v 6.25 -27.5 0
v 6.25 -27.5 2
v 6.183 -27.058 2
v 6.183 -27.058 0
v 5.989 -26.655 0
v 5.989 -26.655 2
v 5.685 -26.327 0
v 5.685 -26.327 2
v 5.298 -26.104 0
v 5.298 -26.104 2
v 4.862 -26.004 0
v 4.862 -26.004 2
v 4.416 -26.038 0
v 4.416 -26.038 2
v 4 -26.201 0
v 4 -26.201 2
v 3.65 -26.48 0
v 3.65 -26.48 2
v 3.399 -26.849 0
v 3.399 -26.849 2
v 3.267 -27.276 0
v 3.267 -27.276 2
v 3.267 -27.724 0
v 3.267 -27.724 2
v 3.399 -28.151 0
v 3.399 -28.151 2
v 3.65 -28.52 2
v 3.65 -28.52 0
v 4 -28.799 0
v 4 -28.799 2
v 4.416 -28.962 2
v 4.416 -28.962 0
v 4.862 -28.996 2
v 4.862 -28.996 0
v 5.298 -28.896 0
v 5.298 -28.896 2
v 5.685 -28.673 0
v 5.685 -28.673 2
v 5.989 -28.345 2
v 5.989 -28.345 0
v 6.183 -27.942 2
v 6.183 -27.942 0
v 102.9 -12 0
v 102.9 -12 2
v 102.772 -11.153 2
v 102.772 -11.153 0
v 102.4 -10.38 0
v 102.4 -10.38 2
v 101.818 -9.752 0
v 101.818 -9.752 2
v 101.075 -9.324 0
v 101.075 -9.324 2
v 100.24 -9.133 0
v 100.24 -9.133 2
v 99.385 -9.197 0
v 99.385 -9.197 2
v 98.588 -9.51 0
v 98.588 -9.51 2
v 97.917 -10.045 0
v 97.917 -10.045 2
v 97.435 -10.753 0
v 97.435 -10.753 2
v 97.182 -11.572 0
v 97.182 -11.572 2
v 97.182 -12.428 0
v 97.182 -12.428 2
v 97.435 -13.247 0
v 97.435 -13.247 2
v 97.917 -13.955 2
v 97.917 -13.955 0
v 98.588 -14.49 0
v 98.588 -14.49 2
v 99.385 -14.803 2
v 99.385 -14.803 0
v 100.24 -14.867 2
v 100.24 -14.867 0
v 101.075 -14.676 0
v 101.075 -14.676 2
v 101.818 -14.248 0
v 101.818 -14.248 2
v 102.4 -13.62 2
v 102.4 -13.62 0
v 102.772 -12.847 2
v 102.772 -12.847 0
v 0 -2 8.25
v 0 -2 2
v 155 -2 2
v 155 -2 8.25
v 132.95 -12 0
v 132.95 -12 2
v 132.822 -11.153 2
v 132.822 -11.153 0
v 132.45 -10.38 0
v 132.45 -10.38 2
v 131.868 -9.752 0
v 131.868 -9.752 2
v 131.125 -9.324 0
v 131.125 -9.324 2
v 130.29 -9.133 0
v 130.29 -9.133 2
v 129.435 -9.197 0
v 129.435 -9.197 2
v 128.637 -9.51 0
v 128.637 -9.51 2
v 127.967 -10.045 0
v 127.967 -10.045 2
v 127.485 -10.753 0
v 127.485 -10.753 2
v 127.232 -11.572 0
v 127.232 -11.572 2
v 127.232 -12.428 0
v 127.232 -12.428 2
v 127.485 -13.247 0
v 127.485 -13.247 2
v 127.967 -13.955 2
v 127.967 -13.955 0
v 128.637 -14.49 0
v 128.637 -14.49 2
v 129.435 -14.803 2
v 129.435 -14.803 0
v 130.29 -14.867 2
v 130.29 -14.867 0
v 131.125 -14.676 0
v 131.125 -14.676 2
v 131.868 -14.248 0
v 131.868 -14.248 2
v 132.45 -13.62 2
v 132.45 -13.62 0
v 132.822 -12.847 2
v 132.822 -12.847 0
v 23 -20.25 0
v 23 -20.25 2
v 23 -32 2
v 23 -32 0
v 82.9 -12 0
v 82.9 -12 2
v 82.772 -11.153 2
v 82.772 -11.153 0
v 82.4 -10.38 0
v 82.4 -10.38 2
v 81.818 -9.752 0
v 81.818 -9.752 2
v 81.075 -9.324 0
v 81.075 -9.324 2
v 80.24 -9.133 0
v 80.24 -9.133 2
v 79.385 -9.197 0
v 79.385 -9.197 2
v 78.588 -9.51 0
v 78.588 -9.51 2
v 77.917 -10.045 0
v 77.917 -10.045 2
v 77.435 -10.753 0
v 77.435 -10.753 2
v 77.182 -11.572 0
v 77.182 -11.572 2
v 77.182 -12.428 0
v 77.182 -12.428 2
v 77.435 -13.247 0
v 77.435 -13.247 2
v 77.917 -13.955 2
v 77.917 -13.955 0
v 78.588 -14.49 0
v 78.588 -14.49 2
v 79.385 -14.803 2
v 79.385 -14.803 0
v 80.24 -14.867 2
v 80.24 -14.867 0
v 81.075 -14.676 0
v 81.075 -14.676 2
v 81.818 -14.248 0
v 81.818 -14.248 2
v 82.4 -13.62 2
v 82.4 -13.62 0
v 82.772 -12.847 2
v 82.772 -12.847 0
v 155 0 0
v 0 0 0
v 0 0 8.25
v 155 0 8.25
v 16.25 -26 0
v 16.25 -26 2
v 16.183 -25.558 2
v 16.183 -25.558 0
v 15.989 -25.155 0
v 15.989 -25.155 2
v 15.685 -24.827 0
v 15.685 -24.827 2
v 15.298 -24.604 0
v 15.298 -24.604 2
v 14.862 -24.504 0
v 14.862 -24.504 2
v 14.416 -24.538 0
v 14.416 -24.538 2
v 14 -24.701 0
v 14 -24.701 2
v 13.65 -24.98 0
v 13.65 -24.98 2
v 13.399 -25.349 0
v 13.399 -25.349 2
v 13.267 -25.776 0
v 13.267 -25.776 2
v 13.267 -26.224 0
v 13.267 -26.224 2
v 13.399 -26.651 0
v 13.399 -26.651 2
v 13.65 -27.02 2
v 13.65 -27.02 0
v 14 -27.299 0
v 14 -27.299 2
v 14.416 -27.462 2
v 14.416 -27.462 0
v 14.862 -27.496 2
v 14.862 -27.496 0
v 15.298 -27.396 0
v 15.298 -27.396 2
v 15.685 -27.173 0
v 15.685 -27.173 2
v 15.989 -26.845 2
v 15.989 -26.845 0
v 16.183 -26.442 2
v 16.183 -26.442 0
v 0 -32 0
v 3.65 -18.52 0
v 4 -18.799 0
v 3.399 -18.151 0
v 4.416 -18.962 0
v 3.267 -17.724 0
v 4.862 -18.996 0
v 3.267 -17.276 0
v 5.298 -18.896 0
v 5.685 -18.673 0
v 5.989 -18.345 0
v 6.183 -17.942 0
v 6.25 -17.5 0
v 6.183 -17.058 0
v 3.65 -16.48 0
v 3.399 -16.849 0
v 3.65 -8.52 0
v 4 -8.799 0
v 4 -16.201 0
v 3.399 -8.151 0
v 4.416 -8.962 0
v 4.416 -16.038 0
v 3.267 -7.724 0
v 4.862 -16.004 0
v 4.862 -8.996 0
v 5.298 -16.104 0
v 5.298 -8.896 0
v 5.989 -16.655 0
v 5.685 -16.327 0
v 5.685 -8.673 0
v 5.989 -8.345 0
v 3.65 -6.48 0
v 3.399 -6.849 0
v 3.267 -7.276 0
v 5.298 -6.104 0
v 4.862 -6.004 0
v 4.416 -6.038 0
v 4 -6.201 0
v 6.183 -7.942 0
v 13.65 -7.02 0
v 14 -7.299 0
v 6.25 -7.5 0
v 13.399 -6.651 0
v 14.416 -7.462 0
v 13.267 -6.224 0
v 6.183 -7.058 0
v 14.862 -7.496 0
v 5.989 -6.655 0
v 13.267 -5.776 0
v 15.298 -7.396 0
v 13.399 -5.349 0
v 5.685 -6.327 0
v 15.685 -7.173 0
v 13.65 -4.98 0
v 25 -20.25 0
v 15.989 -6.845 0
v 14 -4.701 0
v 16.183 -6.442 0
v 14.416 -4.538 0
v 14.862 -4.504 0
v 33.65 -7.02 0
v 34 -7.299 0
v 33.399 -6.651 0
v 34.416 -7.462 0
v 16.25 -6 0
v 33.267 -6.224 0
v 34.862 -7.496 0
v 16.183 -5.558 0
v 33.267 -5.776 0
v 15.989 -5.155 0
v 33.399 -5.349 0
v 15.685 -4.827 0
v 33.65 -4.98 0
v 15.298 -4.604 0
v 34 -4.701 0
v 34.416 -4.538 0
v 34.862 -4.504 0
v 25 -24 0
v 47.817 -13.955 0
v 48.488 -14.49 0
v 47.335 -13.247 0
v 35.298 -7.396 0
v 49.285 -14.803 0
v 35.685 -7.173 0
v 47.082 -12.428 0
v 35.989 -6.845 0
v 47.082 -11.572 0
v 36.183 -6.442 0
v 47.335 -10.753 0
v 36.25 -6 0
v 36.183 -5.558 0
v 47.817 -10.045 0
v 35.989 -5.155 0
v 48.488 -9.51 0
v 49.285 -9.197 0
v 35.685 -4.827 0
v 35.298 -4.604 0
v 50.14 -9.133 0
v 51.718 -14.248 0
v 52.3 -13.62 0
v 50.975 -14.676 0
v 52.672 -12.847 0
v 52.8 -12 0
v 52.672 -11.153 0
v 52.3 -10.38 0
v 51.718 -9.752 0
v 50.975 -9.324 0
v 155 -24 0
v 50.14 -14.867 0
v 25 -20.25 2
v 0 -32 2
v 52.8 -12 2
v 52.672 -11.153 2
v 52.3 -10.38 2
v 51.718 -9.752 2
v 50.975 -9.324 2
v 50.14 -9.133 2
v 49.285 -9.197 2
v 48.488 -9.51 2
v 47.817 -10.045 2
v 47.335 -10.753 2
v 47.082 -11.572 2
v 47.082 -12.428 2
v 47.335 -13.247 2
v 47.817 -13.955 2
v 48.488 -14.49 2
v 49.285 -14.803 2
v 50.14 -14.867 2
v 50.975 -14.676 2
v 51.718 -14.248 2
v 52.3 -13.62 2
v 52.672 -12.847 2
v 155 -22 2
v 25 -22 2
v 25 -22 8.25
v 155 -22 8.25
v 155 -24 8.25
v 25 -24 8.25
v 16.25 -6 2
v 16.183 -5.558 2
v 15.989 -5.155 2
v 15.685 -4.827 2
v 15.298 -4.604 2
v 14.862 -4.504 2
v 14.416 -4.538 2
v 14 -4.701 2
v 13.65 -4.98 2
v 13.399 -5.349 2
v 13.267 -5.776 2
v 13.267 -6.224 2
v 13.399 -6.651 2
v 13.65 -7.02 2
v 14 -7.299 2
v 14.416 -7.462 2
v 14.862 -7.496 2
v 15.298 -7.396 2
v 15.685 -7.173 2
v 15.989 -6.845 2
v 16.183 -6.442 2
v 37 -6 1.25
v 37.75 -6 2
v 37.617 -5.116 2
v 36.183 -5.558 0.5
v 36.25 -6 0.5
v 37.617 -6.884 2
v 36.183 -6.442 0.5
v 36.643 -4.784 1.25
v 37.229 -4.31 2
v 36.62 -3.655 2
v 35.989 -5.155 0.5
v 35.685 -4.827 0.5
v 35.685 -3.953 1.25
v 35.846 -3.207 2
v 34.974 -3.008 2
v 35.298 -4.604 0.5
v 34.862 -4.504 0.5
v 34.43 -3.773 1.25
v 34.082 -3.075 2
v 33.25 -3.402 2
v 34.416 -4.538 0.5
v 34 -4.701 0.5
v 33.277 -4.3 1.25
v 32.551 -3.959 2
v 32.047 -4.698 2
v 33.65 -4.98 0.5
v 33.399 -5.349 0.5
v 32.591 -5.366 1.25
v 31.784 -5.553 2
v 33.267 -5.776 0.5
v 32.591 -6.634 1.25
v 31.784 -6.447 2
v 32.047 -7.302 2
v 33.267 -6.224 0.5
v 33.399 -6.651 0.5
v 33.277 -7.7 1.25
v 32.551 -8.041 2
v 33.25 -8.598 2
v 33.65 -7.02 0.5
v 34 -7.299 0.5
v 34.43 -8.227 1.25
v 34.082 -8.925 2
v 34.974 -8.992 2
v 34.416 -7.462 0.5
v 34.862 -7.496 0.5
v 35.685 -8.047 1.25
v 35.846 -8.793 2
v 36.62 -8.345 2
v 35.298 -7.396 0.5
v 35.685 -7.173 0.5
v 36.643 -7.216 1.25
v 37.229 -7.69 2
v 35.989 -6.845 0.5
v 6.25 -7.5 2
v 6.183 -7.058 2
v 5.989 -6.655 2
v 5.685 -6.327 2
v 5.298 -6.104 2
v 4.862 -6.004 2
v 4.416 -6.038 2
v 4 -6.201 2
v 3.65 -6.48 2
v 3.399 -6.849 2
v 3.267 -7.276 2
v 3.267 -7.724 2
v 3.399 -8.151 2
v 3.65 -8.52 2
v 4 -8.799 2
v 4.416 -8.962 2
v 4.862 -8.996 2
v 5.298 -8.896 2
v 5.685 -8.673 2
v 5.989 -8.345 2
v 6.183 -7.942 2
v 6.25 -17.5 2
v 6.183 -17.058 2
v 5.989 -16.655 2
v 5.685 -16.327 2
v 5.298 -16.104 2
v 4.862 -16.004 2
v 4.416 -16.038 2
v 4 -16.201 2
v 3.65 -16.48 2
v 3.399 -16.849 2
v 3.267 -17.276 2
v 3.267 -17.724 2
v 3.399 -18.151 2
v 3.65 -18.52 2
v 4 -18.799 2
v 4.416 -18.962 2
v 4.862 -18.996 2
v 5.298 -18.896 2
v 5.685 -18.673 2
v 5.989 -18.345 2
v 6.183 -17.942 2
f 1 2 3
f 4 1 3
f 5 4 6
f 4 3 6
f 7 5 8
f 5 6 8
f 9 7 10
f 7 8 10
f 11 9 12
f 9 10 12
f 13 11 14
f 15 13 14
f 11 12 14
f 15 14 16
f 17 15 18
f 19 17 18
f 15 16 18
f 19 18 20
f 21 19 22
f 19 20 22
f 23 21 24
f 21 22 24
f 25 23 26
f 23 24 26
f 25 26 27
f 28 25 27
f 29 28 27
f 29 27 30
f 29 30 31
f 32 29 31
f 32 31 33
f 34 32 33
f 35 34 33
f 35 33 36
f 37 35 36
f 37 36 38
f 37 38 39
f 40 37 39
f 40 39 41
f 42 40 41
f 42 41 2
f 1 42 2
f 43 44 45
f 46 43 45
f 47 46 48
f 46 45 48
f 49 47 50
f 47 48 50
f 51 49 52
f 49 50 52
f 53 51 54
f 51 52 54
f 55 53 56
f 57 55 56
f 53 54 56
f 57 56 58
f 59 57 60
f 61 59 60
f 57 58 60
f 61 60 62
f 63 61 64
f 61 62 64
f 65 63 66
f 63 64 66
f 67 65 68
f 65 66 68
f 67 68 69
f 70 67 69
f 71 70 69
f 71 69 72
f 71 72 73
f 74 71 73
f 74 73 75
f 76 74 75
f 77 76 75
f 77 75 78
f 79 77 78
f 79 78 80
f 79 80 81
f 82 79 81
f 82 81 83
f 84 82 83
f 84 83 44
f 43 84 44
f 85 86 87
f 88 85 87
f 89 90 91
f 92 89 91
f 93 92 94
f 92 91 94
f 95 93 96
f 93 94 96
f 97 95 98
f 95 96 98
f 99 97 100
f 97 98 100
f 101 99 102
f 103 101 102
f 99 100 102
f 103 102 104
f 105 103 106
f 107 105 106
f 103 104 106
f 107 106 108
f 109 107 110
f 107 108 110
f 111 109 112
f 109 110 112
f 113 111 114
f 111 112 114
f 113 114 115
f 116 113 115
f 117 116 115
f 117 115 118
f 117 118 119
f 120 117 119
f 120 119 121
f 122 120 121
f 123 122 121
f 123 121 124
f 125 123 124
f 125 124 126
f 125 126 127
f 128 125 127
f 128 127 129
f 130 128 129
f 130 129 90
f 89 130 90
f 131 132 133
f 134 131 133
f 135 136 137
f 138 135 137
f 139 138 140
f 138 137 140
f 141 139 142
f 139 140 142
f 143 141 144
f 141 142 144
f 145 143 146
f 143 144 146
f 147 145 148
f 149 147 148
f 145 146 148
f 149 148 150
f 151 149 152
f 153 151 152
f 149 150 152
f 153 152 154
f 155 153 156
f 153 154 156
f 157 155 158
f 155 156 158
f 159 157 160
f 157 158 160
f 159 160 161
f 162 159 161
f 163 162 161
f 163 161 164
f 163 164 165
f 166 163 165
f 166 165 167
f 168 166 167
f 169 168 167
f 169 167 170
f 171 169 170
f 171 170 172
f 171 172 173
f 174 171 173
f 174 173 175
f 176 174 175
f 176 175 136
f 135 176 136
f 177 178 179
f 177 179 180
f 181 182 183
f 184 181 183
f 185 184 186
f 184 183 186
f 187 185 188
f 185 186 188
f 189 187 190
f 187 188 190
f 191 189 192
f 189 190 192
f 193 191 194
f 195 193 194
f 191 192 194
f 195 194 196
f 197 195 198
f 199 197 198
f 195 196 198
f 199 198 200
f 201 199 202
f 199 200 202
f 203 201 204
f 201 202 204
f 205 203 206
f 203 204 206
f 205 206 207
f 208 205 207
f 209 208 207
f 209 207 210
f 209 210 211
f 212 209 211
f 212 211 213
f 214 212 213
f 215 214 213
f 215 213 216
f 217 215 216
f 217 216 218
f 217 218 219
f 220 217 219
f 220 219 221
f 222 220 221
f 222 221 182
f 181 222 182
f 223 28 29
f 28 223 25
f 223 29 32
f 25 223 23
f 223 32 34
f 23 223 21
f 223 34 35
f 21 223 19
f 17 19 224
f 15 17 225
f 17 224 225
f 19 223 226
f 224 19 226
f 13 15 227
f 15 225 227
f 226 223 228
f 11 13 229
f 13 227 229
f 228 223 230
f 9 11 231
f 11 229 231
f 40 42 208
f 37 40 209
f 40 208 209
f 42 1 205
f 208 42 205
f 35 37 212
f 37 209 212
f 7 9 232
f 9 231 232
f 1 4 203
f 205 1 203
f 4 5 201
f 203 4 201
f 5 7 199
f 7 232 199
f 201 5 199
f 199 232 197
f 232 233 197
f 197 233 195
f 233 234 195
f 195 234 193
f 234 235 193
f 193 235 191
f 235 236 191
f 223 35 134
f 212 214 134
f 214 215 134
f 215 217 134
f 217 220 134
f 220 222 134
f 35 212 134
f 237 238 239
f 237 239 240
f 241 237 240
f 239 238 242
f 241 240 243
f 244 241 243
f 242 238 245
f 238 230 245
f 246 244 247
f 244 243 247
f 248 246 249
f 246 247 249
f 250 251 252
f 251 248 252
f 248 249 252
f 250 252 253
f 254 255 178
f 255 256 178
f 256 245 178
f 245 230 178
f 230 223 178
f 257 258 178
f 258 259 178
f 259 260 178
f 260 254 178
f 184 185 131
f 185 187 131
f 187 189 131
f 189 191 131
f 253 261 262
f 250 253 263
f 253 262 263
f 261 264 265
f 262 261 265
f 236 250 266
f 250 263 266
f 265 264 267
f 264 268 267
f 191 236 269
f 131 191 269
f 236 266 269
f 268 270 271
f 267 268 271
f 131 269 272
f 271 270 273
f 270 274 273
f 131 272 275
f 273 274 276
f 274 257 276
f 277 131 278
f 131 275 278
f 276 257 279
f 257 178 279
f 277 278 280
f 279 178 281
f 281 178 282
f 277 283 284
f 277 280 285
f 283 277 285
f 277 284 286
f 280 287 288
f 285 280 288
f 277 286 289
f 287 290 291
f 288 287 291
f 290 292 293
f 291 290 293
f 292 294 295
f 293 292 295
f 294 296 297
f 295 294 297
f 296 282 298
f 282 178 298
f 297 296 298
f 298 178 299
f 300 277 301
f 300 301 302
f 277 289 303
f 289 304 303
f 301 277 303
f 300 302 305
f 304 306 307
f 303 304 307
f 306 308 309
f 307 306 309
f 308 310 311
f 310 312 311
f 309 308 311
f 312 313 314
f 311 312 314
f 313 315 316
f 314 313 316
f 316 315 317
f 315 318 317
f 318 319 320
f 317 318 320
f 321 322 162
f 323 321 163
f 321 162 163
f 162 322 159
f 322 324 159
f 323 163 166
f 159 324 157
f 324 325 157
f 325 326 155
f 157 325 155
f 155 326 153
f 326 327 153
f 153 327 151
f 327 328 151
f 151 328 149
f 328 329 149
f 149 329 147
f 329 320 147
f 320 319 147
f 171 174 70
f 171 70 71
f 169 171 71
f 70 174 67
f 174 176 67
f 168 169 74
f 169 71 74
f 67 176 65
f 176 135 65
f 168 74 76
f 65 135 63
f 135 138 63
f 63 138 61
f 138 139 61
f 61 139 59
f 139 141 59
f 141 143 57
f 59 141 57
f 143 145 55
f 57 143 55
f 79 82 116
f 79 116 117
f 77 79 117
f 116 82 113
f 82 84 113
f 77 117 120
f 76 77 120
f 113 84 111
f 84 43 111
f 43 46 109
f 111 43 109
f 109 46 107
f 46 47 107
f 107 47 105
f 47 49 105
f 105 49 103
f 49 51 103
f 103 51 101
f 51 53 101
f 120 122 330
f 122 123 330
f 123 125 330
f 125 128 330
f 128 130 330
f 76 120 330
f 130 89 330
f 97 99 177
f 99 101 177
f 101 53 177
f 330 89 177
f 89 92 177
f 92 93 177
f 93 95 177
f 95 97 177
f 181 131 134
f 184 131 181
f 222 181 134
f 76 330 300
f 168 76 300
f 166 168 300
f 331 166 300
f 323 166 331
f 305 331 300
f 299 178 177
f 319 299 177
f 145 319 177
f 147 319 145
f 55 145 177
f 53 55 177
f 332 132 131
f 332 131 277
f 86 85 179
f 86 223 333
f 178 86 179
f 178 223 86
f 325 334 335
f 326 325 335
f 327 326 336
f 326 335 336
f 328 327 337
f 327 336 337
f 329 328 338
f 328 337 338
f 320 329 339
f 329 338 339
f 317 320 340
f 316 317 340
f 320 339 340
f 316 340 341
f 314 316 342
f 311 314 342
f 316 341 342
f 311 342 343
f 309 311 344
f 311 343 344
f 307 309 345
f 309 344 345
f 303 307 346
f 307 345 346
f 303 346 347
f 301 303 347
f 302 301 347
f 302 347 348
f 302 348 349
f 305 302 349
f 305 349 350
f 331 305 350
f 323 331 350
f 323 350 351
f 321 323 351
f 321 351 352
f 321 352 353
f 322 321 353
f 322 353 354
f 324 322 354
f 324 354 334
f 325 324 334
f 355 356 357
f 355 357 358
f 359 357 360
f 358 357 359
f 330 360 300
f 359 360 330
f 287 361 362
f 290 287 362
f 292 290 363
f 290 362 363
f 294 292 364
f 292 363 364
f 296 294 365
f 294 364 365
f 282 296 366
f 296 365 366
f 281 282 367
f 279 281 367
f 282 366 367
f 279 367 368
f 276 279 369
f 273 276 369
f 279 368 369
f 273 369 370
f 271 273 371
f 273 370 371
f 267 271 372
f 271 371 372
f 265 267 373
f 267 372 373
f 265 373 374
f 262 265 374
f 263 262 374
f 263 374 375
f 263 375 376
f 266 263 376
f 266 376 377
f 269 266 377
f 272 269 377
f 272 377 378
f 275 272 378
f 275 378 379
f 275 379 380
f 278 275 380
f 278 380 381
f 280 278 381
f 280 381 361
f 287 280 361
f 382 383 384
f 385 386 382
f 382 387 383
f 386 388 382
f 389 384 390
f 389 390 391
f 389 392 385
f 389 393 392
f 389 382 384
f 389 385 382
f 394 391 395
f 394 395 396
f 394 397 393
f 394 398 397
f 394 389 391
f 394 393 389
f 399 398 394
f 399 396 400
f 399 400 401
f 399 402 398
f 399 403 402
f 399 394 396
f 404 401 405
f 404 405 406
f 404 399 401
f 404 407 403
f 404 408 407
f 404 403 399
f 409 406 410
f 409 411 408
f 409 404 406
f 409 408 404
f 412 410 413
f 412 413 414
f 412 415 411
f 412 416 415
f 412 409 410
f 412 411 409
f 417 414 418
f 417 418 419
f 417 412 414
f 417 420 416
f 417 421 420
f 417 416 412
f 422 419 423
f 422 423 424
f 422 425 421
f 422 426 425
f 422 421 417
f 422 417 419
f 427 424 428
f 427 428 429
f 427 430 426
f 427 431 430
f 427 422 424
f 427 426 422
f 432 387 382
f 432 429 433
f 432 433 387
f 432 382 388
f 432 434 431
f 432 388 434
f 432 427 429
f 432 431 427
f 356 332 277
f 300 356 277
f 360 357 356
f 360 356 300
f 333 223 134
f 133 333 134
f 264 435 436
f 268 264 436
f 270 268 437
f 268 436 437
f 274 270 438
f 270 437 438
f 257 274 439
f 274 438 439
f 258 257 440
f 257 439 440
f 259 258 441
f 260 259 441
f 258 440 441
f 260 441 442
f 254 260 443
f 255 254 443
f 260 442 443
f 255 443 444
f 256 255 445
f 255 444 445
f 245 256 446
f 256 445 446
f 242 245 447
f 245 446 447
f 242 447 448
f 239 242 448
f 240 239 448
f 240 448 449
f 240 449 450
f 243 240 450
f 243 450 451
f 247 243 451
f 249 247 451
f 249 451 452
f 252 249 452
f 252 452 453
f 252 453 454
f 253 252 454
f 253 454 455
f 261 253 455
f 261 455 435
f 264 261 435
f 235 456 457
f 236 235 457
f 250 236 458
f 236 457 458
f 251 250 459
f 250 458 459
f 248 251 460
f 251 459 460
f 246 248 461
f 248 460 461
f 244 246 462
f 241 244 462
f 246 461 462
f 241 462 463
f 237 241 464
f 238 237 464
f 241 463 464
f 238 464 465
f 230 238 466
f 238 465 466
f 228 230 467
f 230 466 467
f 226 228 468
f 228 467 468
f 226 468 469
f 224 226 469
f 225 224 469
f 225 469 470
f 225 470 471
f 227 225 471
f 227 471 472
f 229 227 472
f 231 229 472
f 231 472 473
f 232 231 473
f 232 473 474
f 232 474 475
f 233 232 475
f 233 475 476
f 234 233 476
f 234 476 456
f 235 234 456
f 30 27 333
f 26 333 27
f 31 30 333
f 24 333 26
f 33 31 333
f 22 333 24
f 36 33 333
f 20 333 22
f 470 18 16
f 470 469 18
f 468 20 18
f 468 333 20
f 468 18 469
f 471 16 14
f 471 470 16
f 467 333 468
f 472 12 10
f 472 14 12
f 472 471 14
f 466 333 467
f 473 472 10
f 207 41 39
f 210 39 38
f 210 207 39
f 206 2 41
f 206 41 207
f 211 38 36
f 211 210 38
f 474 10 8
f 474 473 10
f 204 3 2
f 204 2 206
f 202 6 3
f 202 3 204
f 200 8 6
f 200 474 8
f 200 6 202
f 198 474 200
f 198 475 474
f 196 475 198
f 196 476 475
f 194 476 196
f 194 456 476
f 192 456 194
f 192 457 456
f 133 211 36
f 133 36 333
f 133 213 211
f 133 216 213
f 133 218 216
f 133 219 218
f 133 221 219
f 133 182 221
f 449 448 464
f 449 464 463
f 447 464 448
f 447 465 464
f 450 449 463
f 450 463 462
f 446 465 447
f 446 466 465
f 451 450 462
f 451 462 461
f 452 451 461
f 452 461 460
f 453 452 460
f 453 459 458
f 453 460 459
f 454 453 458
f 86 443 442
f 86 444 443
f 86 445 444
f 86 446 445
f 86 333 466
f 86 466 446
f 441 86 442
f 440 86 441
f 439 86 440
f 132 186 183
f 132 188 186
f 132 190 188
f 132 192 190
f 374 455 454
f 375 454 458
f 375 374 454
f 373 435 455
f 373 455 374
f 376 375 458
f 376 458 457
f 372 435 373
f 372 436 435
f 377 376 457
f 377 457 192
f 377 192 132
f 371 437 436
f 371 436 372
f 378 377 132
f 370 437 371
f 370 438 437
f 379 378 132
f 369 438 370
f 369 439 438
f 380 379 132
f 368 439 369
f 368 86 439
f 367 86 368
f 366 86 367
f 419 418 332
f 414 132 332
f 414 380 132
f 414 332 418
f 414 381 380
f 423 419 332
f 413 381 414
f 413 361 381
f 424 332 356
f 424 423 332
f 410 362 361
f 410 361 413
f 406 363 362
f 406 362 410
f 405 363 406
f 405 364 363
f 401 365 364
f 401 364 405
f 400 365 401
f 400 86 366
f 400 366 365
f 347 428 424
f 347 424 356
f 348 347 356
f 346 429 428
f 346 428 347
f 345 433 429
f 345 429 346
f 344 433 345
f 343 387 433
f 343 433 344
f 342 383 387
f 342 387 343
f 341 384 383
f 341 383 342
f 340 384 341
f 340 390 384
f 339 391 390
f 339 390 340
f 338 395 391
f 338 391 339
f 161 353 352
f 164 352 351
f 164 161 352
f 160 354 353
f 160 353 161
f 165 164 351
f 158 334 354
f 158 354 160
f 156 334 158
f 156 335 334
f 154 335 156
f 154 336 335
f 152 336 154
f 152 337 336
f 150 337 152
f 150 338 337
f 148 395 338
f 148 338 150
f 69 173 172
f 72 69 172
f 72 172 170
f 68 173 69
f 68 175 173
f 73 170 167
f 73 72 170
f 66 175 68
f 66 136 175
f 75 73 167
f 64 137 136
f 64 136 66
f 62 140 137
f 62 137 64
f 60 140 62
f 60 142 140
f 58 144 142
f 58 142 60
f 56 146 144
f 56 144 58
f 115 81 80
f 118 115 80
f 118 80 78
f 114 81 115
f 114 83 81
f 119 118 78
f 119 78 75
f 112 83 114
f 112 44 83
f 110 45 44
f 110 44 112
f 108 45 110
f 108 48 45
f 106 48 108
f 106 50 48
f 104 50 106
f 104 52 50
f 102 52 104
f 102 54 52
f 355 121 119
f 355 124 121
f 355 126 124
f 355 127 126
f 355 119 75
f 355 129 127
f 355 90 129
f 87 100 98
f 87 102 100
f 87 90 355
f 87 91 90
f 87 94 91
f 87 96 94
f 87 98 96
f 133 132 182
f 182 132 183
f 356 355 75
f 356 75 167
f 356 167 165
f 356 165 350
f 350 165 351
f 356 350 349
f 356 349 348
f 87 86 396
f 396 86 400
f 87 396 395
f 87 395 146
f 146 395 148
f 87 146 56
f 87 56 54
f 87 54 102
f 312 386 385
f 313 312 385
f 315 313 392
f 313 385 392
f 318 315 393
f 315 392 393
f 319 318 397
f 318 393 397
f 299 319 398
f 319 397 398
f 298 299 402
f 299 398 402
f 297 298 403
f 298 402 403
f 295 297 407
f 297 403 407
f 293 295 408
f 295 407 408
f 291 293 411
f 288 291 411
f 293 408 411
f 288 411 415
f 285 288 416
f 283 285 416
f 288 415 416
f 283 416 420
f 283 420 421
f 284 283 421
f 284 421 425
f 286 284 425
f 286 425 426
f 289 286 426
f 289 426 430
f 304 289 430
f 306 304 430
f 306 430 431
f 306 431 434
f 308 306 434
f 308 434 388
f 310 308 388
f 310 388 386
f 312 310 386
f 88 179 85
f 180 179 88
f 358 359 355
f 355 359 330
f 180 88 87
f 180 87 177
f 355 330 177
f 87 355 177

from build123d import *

# Parameters (mm, degrees)
SKETCH1_W           = 155
SKETCH1_H           = 32
BOSS_EXTRUDE1_DEPTH = 2
SKETCH2_W           = 155
SKETCH2_H           = 2
SKETCH2_W_2         = 130
BOSS_EXTRUDE2_DEPTH = 6.25
CUT_EXTRUDE1_DEPTH  = 6.25
SKETCH4_R           = 1.5
CUT_EXTRUDE2_DEPTH  = 6.25
SKETCH5_R           = 2.875
CUT_EXTRUDE3_DEPTH  = 6.25
SKETCH6_R           = 1.5
CUT_EXTRUDE4_DEPTH  = 6
CHAMFER1_SIZE       = 1.5


with BuildPart() as part:
    # Sketch1 → Boss-Extrude1 (new body)
    with BuildSketch(Plane.XY):
        with Locations((77.5, -16)):
            Rectangle(SKETCH1_W, SKETCH1_H)
    extrude(amount=BOSS_EXTRUDE1_DEPTH)

    # Sketch2 → Boss-Extrude2 (add)
    with BuildSketch(Plane.XY.offset(2)):
        with Locations((77.5, -1)):
            Rectangle(SKETCH2_W, SKETCH2_H)
        with Locations((90, -23)):
            Rectangle(SKETCH2_W_2, SKETCH2_H)
    extrude(amount=BOSS_EXTRUDE2_DEPTH)

    # Sketch3 → Cut-Extrude1 (cut)
    with BuildSketch(Plane.XY.offset(2)):
        Polygon((155, -32), (23, -32), (23, -24), (23, -20.25), (25, -20.25), (25, -24), (155, -24), align=None)
    extrude(amount=-CUT_EXTRUDE1_DEPTH, mode=Mode.SUBTRACT)

    # Sketch4 → Cut-Extrude2 (cut)
    with BuildSketch(Plane.XY.offset(2)):
        with Locations((4.75, -27.5)):
            Circle(SKETCH4_R)
        with Locations((4.75, -17.5)):
            Circle(SKETCH4_R)
        with Locations((4.75, -7.5)):
            Circle(SKETCH4_R)
    extrude(amount=-CUT_EXTRUDE2_DEPTH, mode=Mode.SUBTRACT)

    # Sketch5 → Cut-Extrude3 (cut)
    with BuildSketch(Plane.XY.offset(2)):
        with Locations((130.075, -12)):
            Circle(SKETCH5_R)
        with Locations((100.025, -12)):
            Circle(SKETCH5_R)
        with Locations((80.025, -12)):
            Circle(SKETCH5_R)
        with Locations((49.925, -12)):
            Circle(SKETCH5_R)
    extrude(amount=-CUT_EXTRUDE3_DEPTH, mode=Mode.SUBTRACT)

    # Sketch6 → Cut-Extrude4 (cut)
    with BuildSketch(Plane.XY.offset(2)):
        with Locations((14.75, -26)):
            Circle(SKETCH6_R)
        with Locations((14.75, -6)):
            Circle(SKETCH6_R)
        with Locations((34.75, -6)):
            Circle(SKETCH6_R)
    extrude(amount=-CUT_EXTRUDE4_DEPTH, mode=Mode.SUBTRACT)

    # Chamfer1
    chamfer1_edges = [part.edges().sort_by_distance(p)[0] for p in [
        (33.25, -6, 2),
    ]]
    chamfer(chamfer1_edges, length=CHAMFER1_SIZE)


solid = part.part
